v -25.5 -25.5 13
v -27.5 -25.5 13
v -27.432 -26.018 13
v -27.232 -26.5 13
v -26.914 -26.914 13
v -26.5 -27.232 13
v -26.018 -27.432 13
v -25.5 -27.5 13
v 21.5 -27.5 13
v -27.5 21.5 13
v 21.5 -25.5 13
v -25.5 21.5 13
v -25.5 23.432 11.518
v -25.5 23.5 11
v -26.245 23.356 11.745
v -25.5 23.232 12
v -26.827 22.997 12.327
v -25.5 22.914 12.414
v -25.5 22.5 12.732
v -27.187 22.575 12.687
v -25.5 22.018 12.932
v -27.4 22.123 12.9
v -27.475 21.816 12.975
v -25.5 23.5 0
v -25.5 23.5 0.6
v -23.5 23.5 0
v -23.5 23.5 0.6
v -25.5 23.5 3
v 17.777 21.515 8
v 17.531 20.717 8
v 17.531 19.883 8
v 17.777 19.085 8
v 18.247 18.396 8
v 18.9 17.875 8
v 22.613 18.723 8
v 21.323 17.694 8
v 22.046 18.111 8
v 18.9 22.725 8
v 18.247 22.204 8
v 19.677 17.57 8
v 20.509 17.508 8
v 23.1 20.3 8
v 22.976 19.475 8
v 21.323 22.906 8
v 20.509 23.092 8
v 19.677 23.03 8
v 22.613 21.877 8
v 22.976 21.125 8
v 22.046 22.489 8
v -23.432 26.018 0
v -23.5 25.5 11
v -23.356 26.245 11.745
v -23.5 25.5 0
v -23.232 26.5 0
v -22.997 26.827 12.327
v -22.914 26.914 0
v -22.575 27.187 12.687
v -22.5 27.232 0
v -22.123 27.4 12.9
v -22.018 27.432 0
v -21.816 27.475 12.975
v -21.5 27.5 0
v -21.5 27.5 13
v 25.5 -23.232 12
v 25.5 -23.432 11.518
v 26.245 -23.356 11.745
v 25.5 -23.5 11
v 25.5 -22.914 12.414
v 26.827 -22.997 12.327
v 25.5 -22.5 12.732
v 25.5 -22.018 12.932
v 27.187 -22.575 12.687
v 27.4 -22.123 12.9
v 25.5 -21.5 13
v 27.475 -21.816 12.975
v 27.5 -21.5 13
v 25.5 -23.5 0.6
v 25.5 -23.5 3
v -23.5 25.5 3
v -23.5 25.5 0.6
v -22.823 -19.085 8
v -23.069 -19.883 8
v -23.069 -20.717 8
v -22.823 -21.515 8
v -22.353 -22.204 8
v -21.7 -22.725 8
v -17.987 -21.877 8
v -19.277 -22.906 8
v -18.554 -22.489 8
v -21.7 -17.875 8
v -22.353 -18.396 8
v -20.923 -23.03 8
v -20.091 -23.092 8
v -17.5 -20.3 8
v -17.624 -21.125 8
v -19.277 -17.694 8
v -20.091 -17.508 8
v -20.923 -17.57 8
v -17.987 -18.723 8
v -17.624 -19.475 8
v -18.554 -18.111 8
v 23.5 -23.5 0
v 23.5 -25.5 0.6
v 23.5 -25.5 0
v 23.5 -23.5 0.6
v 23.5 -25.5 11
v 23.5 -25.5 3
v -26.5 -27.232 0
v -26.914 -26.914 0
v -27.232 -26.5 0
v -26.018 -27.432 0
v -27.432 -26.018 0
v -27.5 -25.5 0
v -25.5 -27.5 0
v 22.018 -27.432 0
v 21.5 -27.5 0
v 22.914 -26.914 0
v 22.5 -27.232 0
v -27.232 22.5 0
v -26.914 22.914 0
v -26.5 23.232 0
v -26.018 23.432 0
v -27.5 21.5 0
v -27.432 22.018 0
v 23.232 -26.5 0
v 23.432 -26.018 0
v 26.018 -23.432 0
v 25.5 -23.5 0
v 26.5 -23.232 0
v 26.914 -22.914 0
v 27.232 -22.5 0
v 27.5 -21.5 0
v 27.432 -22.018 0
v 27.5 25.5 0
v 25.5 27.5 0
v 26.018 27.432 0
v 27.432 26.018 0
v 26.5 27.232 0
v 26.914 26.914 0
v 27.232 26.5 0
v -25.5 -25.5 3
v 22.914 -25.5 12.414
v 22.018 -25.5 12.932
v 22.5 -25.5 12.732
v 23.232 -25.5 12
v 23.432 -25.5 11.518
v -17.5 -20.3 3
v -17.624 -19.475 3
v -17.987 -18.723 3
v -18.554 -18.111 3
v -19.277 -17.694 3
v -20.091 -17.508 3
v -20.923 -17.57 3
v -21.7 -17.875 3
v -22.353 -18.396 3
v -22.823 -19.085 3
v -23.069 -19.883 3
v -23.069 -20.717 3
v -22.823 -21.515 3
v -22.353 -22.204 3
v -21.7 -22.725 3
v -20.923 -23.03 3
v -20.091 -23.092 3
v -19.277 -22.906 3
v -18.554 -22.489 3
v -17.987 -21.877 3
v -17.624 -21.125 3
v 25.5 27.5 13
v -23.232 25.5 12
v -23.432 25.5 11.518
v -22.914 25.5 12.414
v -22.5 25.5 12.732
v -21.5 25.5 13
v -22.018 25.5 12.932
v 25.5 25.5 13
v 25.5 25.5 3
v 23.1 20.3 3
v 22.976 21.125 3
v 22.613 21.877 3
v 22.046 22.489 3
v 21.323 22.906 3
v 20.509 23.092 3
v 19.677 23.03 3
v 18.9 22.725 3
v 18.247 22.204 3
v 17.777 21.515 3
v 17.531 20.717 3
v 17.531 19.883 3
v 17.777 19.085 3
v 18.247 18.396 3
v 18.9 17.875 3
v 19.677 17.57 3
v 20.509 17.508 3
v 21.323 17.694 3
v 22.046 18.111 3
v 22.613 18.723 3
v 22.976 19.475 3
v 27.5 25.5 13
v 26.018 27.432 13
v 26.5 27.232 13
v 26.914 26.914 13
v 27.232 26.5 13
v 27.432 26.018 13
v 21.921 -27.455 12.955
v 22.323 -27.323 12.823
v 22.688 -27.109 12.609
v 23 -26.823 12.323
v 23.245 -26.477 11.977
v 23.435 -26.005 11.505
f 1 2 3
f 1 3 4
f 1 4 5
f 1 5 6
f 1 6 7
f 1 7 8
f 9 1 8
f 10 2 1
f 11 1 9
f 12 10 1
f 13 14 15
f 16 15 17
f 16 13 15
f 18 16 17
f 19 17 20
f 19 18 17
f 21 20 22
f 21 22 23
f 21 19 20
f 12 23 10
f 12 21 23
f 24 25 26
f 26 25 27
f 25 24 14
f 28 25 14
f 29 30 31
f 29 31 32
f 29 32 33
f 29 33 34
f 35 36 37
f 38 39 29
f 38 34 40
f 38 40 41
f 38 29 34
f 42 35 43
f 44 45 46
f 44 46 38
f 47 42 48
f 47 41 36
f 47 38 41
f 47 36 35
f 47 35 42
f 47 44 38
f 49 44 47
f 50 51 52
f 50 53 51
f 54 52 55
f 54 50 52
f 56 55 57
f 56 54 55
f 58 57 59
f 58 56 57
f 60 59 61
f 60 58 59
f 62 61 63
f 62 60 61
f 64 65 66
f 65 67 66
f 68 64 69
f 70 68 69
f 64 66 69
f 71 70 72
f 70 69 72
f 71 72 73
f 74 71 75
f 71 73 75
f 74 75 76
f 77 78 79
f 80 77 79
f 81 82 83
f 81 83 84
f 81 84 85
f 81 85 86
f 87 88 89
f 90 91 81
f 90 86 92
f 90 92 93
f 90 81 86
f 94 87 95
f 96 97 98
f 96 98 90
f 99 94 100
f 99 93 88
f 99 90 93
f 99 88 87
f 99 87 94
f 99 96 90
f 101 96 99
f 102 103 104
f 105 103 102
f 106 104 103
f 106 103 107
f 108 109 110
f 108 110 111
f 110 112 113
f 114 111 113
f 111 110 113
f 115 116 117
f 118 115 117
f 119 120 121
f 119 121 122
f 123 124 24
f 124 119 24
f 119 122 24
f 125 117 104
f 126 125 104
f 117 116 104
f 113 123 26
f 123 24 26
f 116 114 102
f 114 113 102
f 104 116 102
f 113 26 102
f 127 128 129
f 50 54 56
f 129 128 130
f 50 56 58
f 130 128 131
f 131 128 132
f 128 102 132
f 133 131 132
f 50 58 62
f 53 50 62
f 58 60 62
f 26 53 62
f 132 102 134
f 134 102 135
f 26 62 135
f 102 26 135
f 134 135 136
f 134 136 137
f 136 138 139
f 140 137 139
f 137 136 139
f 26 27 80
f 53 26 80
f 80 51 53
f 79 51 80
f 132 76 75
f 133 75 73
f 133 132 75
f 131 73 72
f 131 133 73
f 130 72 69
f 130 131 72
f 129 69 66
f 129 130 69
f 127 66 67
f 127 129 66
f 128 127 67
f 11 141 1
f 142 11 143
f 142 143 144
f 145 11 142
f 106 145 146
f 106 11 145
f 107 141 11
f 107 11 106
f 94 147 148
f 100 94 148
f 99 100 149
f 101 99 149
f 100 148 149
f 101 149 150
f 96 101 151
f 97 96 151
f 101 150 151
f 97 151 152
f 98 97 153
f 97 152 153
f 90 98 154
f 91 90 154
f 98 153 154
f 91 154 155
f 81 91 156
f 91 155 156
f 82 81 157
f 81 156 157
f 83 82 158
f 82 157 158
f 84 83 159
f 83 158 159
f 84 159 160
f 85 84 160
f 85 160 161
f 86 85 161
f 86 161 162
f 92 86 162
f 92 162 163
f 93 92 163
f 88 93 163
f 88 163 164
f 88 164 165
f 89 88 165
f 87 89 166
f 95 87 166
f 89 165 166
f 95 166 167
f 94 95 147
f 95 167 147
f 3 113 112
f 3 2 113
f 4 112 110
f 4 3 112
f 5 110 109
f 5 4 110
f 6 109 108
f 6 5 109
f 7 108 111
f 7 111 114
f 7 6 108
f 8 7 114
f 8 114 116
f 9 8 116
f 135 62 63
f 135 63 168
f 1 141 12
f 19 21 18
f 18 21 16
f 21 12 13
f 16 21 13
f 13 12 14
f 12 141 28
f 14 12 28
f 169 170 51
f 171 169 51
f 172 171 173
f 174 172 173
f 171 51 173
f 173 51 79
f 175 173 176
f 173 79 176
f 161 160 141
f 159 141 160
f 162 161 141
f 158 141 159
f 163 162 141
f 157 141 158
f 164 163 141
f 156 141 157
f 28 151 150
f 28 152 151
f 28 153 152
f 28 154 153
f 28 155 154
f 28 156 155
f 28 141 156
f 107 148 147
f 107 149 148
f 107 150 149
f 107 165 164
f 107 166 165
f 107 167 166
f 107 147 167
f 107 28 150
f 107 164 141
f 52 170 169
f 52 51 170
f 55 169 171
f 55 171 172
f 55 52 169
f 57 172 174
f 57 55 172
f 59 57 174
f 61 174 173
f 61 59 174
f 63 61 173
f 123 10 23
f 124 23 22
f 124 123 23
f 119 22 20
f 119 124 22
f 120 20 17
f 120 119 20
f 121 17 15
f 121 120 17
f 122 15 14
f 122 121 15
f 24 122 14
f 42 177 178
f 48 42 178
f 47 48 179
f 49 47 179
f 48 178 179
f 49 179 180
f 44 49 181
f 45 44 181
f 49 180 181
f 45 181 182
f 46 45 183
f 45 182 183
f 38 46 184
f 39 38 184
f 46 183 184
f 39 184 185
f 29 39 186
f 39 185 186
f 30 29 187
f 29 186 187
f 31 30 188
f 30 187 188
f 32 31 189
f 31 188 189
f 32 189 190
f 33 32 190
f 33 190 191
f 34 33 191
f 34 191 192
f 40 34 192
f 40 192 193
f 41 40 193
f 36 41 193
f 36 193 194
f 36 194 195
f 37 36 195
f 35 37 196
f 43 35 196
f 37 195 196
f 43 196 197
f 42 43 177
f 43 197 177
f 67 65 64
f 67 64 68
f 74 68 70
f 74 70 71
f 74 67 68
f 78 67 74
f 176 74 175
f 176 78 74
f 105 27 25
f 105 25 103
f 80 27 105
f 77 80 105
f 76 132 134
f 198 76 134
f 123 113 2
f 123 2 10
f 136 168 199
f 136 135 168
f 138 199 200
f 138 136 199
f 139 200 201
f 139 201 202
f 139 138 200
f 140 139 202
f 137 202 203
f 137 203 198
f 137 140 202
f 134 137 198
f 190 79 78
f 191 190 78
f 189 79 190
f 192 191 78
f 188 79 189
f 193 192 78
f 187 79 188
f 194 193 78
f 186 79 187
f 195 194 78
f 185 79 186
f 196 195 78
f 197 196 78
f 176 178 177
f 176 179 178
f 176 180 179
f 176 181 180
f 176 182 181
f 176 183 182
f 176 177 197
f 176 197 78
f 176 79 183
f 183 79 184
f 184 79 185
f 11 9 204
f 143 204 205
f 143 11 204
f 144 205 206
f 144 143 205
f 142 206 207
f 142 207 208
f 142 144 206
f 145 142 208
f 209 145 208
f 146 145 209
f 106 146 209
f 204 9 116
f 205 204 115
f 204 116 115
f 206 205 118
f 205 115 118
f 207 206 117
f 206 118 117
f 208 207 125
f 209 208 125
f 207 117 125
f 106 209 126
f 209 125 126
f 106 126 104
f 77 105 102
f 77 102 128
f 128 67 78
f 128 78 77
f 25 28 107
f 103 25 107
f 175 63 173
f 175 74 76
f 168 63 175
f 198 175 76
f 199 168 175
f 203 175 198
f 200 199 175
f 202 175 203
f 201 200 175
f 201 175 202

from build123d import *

# Parameters (mm, degrees)
F0_W     = 55
F0_H     = 55
F1_DEPTH = 3
F2_W     = 55
F2_H     = 55
F2_W_2   = 51
F2_H_2   = 51
F3_DEPTH = 10
F4_R     = 2.8
F5_DEPTH = 5
F6_W     = 4
F6_H     = 4
F7_DEPTH = 25
F9_DEPTH = 2.4
F10_R    = 1.99999


# Not quite as in the source:
# - a fillet or chamfer is up to 0.001 mm smaller than in the source, because OpenCascade refuses the exact size


with BuildPart() as f1:
    # F0 (on Top) → F1 (new body)
    with BuildSketch(Plane.XY):
        Rectangle(F0_W, F0_H)
    extrude(amount=F1_DEPTH)

    # F2 (on face) → F3 (join)
    with BuildSketch(Plane.XY.offset(3)):
        Rectangle(F2_W, F2_H)
        Rectangle(F2_W_2, F2_H_2, mode=Mode.SUBTRACT)
    extrude(amount=F3_DEPTH)

    # F4 (on face) → F5 (join)
    with BuildSketch(Plane.XY.offset(3)):
        with Locations((-20.3, -20.3)):
            Circle(F4_R)
        with Locations((20.3, 20.3)):
            Circle(F4_R)
    extrude(amount=F5_DEPTH)

    # F6 (on face) → F7 (cut)
    with BuildSketch(Plane.XY.offset(13)):
        with Locations((-25.5, 25.5)):
            Rectangle(F6_W, F6_H)
        with Locations((25.5, -25.5)):
            Rectangle(F6_W, F6_H)
    extrude(amount=-F7_DEPTH, mode=Mode.SUBTRACT)

    # F8 (on face) → F9 (cut)
    with BuildSketch(Plane.XY.offset(3)):
        Polygon((-23.5, 25.5), (-25.5, 23.5), (23.5, -25.5), (25.5, -23.5), align=None)
    extrude(amount=-F9_DEPTH, mode=Mode.SUBTRACT)

    # F10 (radius 2 in the source; OpenCascade refuses exactly that, so slightly less here)
    f10_edges = [f1.edges().sort_by_distance(p)[0] for p in [
        (-26.5, 23.5, 13),
        (23.5, -26.5, 13),
        (26.5, -23.5, 13),
        (-23.5, 26.5, 13),
        (-27.5, 23.5, 6.5),
        (-23.5, 27.5, 6.5),
        (23.5, -27.5, 6.5),
        (27.5, -23.5, 6.5),
        (-27.5, -27.5, 6.5),
        (27.5, 27.5, 6.5),
    ]]
    fillet(f10_edges, radius=F10_R)


solid = f1.part
